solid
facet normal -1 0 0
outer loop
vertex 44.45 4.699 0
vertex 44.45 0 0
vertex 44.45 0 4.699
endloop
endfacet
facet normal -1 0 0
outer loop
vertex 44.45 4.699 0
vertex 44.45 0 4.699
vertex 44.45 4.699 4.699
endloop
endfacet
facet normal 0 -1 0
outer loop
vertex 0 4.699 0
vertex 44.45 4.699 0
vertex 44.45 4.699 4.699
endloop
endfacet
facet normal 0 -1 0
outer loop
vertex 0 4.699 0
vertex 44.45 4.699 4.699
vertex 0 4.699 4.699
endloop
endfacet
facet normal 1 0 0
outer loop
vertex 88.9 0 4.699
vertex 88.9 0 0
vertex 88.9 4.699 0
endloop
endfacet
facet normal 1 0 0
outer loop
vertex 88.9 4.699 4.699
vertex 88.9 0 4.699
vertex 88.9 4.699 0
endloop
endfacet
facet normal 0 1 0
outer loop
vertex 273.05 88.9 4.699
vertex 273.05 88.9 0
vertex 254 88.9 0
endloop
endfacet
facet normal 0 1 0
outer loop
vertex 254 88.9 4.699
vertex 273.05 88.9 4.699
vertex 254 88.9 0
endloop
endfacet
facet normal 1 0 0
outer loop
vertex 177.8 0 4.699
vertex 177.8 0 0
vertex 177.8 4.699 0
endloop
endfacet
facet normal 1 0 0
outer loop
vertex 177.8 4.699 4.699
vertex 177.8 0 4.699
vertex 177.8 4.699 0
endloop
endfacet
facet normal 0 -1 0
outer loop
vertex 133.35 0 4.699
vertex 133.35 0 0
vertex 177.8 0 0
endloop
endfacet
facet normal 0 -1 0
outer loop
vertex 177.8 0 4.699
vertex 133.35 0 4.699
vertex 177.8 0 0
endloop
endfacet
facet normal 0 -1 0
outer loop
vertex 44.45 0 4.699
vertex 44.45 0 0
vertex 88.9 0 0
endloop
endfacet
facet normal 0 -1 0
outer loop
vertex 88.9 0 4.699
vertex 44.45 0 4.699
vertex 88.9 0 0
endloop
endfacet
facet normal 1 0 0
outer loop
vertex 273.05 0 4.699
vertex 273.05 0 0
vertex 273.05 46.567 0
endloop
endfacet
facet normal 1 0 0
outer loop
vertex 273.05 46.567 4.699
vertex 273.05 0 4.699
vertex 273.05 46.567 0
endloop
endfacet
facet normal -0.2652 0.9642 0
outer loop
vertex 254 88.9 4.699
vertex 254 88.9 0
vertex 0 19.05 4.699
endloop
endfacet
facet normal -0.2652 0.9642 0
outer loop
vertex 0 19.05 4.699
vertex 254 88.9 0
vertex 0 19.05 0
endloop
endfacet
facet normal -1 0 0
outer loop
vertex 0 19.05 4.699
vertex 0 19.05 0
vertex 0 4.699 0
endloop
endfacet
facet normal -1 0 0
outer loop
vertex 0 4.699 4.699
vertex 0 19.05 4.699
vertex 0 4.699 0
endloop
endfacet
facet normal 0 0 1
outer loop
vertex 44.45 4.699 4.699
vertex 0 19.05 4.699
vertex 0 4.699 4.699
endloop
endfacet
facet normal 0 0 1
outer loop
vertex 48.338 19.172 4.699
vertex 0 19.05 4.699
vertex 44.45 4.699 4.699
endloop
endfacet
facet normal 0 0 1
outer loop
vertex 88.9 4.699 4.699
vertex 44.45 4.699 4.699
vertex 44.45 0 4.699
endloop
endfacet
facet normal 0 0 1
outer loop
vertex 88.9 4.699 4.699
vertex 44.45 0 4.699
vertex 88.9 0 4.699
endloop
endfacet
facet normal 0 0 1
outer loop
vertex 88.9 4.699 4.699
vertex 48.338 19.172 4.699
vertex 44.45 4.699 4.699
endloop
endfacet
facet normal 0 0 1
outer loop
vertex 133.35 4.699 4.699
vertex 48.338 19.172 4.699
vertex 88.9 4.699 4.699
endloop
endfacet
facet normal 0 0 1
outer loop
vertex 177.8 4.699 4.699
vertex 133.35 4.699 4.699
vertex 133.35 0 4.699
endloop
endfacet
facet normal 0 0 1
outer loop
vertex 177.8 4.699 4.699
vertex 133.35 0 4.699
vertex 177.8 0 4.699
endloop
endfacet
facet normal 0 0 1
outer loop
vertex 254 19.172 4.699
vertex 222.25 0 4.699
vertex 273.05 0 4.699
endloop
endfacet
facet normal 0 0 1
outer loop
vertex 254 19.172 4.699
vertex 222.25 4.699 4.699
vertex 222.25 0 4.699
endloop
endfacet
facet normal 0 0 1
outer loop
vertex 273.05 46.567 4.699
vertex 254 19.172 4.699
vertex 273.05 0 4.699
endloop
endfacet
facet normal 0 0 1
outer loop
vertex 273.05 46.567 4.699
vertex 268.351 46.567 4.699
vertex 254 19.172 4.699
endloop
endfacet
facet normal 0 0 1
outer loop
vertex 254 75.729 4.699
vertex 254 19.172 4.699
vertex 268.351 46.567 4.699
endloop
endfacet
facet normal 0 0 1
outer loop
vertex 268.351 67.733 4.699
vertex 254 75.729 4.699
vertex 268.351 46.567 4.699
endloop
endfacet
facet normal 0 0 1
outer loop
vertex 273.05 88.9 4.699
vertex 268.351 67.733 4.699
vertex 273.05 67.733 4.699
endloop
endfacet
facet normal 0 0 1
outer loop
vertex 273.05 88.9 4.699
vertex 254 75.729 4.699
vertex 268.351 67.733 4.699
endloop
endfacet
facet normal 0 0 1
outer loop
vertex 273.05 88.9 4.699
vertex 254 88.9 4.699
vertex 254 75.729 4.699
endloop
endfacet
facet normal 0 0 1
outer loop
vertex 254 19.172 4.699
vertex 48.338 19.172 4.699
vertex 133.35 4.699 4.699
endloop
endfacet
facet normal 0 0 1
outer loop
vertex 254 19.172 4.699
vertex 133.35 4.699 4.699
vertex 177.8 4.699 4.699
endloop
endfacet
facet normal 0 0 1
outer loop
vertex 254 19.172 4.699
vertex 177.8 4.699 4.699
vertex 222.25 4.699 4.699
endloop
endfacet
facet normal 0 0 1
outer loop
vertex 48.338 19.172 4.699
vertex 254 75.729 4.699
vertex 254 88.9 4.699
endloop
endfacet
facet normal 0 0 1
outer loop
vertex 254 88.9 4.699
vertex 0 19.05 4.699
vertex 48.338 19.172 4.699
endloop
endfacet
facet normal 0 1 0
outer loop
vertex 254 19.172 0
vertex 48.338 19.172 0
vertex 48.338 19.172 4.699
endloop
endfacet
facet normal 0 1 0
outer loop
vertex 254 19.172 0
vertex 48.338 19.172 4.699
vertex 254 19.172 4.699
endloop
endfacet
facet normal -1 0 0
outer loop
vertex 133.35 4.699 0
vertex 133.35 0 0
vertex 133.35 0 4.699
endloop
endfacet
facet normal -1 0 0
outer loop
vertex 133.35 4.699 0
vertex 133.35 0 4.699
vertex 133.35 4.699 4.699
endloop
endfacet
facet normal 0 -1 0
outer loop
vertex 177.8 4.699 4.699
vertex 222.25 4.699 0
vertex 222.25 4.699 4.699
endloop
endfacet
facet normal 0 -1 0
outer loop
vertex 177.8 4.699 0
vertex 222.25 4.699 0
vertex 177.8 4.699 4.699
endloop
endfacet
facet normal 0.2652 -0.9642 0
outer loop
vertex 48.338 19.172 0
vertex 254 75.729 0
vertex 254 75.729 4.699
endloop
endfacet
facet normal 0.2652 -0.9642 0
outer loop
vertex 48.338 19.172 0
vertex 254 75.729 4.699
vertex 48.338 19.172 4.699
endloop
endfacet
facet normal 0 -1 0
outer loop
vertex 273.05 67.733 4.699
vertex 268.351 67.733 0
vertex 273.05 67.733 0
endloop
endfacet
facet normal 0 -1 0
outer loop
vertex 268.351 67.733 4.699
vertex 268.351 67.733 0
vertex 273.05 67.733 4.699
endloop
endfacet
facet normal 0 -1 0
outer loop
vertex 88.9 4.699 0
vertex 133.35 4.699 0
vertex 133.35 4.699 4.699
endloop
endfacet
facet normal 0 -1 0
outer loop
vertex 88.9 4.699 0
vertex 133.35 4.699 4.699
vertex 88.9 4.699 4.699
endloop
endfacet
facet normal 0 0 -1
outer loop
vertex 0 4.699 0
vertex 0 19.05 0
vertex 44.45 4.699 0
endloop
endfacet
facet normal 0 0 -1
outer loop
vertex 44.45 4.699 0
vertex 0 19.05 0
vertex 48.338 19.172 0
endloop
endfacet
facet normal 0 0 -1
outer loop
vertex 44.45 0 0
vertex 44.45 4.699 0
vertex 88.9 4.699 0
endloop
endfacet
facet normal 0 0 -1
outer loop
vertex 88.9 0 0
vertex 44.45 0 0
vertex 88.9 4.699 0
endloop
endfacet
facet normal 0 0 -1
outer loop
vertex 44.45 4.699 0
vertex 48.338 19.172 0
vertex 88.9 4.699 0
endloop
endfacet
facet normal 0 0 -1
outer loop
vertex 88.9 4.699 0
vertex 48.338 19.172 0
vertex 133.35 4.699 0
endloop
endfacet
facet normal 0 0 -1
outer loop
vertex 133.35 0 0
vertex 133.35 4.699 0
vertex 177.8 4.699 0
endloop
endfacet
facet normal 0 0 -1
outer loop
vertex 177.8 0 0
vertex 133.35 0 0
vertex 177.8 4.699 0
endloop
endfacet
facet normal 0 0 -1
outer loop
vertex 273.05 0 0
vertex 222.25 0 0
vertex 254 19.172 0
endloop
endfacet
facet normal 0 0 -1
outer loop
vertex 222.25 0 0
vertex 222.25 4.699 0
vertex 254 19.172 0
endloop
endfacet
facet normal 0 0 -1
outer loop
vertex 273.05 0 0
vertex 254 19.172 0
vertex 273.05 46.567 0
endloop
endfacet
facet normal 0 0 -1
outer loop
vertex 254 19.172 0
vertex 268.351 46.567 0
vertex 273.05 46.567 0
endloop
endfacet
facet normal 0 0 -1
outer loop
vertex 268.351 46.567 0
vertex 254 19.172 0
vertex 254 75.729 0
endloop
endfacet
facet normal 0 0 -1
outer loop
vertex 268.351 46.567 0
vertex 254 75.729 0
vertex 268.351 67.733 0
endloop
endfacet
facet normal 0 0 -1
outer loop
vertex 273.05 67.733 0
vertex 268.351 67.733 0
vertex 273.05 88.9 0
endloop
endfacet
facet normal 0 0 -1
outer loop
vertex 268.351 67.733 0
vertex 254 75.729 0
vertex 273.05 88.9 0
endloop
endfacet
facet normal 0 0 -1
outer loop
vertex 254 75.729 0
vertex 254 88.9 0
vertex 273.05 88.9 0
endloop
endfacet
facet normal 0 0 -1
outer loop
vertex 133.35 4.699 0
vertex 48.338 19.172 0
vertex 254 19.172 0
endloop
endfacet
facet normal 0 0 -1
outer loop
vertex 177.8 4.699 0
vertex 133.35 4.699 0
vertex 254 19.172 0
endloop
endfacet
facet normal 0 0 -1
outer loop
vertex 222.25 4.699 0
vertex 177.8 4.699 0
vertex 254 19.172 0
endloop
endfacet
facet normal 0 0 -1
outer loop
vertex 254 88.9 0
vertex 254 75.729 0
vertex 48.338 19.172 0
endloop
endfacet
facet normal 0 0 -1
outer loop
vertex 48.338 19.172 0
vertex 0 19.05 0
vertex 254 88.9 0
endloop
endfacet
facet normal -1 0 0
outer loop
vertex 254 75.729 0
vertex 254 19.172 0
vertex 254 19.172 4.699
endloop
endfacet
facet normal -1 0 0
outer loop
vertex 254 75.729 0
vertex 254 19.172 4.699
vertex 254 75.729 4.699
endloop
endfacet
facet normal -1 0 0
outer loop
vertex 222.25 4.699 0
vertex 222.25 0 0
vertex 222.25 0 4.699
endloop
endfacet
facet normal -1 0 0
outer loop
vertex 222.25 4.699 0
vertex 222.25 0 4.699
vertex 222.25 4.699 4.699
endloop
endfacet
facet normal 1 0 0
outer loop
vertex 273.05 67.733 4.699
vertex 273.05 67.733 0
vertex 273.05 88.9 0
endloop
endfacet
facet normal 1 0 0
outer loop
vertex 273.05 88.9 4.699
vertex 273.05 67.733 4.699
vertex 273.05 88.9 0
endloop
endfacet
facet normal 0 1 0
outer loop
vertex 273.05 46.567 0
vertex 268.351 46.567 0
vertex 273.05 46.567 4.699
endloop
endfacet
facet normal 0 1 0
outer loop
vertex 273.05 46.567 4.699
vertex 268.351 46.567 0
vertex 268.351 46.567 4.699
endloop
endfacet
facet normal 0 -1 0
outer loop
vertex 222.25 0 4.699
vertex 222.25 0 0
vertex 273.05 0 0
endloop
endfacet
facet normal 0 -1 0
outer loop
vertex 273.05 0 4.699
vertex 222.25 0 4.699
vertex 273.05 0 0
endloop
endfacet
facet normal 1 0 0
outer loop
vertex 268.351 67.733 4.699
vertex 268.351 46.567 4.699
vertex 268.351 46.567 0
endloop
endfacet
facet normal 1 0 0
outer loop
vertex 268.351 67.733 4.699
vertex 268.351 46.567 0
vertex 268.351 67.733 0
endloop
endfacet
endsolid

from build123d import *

# Parameters (mm, degrees)
BOSS_EXTRUDE1_DEPTH = 4.699
SKETCH2_W           = 44.45
SKETCH2_H           = 4.699
CUT_EXTRUDE1_DEPTH  = 288.196060581
CAVITY3_START       = 268.350970906
CAVITY3_OUTLINE_W   = 21.166666666
CAVITY3_OUTLINE_H   = 4.699
CAVITY3_DEPTH       = 4.699


# Read off the part's stored shape, not the designer's step: Cavity3
with BuildPart() as part:
    # Sketch1 → Boss-Extrude1 (new body)
    with BuildSketch(Plane.XY):
        Polygon((273.049970906, 58.684987569), (273.049970906, 88.9), (253.999970906, 88.9), (0, 19.05), (0, 0), (273.049970906, 0), (273.049970906, 30.215012431), align=None)
        Polygon((48.33831711, 19.171571116), (253.999970906, 19.171571116), (253.999970906, 75.728532388), align=None, mode=Mode.SUBTRACT)
    extrude(amount=BOSS_EXTRUDE1_DEPTH)

    # Sketch2 → Cut-Extrude1 (cut, through all)
    with BuildSketch(Plane(origin=(0, 0, 0), x_dir=(-1, 0, 0), z_dir=(0, 0, -1))):
        with Locations((-22.225, 2.3495)):
            Rectangle(SKETCH2_W, SKETCH2_H)
        with Locations((-111.125, 2.3495)):
            Rectangle(SKETCH2_W, SKETCH2_H)
        with Locations((-200.025, 2.3495)):
            Rectangle(SKETCH2_W, SKETCH2_H)
    extrude(amount=-CUT_EXTRUDE1_DEPTH, mode=Mode.SUBTRACT)

    # Cavity3 outline → Cavity3 (cut)
    with BuildSketch(Plane.YZ.offset(CAVITY3_START)):
        with Locations((57.15, 2.3495)):
            Rectangle(CAVITY3_OUTLINE_W, CAVITY3_OUTLINE_H)
    extrude(amount=CAVITY3_DEPTH, mode=Mode.SUBTRACT)


solid = part.part
